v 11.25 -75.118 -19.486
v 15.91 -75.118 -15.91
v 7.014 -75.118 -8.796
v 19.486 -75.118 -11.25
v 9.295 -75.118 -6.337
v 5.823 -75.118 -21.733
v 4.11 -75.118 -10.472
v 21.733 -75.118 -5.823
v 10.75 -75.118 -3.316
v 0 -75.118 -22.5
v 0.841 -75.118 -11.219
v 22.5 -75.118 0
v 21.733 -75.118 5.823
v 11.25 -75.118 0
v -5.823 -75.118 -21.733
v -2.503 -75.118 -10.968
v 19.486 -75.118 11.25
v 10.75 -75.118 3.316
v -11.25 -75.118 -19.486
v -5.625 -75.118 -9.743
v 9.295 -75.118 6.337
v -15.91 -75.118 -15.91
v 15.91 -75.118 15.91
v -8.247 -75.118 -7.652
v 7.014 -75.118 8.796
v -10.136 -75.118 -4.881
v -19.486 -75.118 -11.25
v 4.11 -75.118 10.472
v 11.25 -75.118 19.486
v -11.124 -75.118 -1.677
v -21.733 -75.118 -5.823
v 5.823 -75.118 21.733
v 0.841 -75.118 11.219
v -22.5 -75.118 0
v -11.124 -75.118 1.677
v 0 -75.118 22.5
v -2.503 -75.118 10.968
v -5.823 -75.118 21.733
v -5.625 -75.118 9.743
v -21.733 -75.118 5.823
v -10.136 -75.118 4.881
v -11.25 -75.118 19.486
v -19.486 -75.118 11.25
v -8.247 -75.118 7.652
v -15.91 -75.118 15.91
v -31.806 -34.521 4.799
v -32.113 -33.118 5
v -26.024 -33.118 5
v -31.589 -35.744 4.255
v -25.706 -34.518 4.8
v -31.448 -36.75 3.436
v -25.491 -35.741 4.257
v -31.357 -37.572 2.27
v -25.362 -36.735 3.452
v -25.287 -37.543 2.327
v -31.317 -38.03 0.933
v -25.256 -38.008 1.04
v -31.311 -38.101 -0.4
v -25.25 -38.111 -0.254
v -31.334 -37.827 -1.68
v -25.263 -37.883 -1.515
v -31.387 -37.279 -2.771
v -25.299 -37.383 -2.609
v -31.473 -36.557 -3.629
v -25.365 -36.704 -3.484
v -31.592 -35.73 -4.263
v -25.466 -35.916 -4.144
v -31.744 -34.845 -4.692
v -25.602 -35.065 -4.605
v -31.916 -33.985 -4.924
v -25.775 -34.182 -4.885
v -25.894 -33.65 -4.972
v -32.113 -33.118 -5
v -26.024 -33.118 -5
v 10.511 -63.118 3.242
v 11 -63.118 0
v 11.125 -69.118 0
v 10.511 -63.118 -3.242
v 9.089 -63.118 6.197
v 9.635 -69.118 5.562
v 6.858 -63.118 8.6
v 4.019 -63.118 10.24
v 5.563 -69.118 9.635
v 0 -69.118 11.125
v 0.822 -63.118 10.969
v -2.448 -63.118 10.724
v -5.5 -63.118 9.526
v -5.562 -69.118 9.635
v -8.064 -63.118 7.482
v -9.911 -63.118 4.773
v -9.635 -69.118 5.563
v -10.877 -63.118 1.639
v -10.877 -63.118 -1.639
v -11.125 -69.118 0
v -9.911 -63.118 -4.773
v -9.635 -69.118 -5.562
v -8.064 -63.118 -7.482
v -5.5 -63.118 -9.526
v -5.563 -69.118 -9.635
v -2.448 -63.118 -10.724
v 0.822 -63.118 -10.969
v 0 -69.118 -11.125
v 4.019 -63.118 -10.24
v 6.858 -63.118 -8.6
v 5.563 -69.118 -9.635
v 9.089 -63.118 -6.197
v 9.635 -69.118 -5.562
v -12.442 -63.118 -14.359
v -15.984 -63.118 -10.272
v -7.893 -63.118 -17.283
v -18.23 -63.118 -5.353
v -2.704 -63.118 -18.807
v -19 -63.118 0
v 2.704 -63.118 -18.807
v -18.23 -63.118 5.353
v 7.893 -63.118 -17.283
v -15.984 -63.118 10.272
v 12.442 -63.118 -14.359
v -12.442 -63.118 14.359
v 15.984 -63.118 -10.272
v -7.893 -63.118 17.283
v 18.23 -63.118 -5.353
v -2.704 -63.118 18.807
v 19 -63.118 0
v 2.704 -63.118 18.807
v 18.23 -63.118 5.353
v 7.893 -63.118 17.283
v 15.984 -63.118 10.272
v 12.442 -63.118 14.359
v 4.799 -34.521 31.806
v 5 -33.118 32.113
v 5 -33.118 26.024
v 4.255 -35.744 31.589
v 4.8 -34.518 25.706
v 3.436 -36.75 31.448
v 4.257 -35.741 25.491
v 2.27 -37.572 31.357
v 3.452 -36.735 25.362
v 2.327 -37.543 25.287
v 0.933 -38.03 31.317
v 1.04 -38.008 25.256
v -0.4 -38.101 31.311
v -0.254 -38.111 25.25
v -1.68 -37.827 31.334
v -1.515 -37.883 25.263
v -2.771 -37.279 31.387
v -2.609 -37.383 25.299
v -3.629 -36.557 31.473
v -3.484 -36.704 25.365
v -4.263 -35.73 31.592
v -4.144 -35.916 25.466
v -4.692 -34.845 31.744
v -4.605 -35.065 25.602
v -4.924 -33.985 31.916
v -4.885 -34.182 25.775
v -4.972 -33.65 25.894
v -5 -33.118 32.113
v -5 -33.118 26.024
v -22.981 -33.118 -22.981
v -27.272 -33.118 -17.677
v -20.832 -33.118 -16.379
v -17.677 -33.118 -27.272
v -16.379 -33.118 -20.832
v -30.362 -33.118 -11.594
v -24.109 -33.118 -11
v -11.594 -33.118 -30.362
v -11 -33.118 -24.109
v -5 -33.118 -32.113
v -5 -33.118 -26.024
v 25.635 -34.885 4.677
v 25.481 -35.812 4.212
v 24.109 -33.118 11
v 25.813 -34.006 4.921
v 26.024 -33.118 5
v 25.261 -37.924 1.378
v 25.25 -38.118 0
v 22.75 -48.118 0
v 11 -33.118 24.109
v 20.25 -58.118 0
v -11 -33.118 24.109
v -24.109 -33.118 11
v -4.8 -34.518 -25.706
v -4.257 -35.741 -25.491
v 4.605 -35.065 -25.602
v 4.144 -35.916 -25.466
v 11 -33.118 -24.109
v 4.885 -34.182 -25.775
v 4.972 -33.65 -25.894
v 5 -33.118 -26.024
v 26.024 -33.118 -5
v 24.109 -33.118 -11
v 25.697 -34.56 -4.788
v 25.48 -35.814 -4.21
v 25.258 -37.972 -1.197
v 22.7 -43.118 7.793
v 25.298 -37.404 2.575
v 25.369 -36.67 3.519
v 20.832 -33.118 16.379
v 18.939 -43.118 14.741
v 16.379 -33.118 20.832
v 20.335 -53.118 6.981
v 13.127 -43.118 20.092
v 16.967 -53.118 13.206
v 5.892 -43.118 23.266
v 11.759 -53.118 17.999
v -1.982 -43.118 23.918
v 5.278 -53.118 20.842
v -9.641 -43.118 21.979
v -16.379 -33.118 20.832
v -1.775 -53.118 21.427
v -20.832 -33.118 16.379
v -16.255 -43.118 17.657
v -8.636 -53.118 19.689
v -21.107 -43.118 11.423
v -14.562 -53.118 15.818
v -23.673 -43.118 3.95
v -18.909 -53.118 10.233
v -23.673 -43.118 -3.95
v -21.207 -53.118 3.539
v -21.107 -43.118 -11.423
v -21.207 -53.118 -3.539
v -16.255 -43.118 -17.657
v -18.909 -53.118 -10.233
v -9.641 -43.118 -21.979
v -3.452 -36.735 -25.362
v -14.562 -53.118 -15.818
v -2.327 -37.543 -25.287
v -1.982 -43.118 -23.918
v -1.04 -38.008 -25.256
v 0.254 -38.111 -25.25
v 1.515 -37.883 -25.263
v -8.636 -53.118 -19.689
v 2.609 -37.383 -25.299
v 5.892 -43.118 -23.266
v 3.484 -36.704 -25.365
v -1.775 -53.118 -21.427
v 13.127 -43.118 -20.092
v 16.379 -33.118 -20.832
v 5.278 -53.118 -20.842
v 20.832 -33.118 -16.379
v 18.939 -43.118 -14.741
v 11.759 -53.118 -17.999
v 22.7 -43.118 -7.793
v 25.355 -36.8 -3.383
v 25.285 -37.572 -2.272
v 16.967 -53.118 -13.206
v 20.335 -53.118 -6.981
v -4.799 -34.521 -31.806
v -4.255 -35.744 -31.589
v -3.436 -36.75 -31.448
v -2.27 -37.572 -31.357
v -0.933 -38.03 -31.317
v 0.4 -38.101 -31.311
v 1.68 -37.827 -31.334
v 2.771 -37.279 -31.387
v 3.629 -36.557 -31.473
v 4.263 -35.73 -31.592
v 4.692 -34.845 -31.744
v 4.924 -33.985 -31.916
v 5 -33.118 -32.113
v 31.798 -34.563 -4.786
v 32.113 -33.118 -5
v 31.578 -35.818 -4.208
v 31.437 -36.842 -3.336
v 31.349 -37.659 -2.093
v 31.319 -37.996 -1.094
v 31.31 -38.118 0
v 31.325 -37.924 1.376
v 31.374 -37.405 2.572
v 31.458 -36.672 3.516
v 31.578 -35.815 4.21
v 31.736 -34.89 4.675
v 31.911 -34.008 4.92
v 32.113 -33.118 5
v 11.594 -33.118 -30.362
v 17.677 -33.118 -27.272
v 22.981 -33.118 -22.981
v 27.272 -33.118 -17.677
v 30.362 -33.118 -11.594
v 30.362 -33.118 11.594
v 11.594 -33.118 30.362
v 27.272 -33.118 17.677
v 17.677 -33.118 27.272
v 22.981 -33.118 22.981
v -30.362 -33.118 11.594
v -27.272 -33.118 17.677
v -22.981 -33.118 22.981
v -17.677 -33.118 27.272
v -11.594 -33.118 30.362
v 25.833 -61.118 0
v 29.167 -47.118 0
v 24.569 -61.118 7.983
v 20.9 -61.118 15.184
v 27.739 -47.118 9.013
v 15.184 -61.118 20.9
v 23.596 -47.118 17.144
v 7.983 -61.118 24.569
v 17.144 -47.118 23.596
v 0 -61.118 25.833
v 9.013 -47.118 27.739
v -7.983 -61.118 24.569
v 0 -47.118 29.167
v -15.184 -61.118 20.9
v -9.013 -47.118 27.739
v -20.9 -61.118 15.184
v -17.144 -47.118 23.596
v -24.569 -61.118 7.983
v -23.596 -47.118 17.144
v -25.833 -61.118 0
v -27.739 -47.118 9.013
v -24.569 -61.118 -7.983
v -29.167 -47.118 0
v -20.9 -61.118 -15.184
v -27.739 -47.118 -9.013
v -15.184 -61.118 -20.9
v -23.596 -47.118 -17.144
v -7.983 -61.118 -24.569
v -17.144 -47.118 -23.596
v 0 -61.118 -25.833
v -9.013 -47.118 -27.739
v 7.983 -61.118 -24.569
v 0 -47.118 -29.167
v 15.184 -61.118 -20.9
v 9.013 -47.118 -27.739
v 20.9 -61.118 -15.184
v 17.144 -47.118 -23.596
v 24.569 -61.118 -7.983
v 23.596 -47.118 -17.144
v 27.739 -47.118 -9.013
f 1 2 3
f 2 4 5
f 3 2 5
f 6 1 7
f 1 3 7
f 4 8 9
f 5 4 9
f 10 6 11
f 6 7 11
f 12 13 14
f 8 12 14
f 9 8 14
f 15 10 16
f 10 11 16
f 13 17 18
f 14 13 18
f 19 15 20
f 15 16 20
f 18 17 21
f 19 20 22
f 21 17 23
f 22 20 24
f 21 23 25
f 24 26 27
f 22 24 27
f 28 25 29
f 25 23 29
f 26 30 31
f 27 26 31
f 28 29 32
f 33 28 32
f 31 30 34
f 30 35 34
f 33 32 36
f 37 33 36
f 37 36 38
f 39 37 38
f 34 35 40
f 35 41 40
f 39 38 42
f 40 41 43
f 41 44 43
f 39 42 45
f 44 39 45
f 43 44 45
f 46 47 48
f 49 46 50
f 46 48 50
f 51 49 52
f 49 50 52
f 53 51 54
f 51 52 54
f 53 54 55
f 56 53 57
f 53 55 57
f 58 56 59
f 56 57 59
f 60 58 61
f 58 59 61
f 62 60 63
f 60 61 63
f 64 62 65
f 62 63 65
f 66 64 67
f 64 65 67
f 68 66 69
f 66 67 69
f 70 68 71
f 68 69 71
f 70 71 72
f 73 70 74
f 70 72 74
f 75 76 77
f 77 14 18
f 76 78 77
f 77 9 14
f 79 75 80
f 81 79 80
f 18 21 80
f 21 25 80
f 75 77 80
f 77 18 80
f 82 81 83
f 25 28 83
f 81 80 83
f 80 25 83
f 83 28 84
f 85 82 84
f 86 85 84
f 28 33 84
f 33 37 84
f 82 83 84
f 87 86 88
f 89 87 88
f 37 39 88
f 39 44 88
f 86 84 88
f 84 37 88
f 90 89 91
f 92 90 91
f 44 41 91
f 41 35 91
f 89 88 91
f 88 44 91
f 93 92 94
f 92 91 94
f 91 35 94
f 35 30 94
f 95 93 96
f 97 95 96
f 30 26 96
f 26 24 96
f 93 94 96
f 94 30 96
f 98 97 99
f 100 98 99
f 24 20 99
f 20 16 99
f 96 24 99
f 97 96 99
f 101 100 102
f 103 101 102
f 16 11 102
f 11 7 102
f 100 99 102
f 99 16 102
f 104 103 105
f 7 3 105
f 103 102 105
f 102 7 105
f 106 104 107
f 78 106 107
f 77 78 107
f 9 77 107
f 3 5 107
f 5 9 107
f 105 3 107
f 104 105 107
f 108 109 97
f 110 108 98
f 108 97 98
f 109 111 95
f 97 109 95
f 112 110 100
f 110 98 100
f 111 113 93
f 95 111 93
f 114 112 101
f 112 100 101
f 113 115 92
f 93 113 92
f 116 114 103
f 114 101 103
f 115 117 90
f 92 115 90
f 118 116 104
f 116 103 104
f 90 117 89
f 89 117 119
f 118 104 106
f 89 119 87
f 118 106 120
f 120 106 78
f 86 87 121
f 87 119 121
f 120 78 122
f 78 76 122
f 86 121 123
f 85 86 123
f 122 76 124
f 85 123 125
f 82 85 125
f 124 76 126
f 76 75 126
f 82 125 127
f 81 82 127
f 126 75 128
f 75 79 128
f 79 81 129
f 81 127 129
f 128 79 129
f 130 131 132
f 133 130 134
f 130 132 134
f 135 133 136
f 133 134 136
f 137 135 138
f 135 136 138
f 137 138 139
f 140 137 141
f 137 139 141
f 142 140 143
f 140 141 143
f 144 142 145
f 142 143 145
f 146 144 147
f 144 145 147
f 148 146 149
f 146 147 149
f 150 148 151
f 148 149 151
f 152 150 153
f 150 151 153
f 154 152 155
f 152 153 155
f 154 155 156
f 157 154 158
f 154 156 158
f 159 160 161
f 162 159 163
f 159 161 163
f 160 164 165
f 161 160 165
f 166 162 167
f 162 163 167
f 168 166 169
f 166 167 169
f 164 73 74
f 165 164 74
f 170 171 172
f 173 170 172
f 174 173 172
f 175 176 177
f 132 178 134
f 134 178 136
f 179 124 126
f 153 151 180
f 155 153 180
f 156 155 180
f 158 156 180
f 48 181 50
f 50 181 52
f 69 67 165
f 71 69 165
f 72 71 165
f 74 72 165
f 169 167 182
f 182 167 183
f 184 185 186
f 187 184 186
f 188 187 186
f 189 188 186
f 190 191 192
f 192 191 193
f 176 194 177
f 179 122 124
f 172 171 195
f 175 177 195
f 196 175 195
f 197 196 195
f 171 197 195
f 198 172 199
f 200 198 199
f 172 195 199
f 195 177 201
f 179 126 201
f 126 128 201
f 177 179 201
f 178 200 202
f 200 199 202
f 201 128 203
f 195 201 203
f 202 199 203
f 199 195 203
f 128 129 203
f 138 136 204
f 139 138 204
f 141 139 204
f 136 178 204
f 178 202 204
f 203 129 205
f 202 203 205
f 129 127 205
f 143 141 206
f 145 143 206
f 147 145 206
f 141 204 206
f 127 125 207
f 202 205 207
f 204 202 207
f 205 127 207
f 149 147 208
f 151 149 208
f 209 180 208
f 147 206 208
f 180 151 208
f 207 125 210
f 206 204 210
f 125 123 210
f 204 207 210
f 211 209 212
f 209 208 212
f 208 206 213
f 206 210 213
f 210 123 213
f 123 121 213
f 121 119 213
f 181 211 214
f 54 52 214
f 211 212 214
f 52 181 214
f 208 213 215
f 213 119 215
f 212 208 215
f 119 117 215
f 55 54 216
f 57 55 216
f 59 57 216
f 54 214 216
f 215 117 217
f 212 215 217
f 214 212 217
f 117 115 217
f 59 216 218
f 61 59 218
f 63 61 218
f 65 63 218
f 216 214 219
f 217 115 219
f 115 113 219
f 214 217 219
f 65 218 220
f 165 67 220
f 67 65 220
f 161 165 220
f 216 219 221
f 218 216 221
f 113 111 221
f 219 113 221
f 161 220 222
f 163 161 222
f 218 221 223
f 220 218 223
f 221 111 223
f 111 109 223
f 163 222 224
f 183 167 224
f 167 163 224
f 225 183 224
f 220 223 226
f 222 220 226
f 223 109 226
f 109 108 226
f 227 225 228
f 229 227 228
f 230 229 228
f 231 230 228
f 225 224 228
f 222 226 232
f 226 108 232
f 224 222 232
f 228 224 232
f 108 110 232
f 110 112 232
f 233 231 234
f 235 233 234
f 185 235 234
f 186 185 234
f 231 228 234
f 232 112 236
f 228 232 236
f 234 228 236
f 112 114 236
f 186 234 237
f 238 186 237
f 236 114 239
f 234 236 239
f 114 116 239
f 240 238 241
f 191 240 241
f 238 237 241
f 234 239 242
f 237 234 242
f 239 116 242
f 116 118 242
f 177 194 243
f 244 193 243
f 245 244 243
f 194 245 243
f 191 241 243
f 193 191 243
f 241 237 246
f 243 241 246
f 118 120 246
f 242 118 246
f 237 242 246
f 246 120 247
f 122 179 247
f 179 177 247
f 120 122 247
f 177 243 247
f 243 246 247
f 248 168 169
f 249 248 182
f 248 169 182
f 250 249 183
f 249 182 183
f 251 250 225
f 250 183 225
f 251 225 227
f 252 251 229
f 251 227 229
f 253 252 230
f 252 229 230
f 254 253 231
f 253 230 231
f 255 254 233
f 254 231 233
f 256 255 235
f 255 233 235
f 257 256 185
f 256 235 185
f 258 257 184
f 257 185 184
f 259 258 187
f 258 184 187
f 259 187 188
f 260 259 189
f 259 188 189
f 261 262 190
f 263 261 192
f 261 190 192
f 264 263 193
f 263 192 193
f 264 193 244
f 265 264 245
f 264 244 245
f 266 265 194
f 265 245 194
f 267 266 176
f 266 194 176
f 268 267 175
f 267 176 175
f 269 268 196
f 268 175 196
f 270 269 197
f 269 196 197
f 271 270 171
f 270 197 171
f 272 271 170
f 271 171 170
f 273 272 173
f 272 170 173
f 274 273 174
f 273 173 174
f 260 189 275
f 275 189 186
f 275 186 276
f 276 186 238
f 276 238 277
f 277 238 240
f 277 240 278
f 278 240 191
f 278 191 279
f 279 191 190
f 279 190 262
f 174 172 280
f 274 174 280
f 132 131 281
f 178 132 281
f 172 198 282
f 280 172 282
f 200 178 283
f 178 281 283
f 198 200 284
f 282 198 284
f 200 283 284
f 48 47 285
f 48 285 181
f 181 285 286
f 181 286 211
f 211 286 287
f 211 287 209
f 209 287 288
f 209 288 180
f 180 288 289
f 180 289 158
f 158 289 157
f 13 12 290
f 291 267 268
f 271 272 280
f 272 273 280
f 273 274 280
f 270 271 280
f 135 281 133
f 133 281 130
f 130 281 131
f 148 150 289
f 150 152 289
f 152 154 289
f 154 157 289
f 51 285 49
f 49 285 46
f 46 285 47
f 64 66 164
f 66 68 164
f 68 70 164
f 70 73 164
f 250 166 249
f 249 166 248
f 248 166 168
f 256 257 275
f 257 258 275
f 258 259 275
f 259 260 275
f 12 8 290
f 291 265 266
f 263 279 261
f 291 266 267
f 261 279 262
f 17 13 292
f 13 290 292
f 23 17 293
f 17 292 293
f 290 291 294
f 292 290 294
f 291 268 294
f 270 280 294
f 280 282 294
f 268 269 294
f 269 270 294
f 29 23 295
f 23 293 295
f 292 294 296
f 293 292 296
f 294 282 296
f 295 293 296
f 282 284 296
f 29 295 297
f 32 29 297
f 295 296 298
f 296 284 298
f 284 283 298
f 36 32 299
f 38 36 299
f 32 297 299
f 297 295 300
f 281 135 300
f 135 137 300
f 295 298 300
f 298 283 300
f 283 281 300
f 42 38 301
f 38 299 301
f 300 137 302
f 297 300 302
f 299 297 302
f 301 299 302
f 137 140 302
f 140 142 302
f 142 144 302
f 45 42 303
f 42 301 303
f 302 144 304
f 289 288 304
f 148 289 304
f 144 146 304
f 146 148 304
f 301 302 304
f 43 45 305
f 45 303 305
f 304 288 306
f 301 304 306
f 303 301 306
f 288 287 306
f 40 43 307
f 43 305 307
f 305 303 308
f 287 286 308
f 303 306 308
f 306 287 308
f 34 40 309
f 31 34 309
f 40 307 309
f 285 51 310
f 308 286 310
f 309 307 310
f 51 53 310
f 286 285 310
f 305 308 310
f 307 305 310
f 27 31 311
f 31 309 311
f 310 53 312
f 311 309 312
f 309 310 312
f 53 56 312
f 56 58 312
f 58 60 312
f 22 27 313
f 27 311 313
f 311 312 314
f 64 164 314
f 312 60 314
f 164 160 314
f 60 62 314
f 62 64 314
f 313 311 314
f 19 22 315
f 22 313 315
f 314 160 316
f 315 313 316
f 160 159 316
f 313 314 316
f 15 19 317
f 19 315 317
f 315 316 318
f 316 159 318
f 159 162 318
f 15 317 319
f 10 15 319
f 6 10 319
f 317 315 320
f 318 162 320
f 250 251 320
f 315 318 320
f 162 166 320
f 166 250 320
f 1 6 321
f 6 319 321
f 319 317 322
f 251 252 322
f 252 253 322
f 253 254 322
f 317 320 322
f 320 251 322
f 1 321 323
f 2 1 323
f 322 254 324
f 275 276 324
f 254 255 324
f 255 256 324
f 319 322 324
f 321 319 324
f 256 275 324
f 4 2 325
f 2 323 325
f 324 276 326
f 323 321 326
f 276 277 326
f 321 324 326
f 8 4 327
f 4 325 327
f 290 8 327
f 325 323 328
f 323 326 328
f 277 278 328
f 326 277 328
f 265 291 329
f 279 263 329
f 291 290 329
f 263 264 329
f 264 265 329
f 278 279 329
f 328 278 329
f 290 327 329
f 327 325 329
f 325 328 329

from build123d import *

# Parameters (mm, degrees)
SKETCH2_R          = 5
CUT_EXTRUDE1_DEPTH = 56
CIRPATTERN1_COUNT  = 4


with BuildPart() as part:
    # Sketch1 → Revolve1 (revolve)
    with BuildSketch(Plane.XY):
        Polygon((11.25, -75.117525247), (22.5, -75.117525247), (32.5, -33.117525247), (26.5, -33.117525247), (19, -63.117525247), (11, -63.117525247), align=None)
    revolve(axis=Axis((0, 54.787552818, 0), (0, -1, 0)))

    # Sketch2 → Cut-Extrude1 (cut)
    with BuildSketch(Plane.XY):
        with Locations((0, -33.117525247)):
            Circle(SKETCH2_R)
    cut_extrude1 = extrude(amount=-CUT_EXTRUDE1_DEPTH, mode=Mode.SUBTRACT)

    # CirPattern1: Cut-Extrude1 ×4 about axis
    cirpattern1_axis = Axis((0, -63.117525247, 0), (0, -1, 0))
    for i in range(1, CIRPATTERN1_COUNT):
        add(cut_extrude1.rotate(cirpattern1_axis, i * 360 / CIRPATTERN1_COUNT), mode=Mode.SUBTRACT)


solid = part.part
